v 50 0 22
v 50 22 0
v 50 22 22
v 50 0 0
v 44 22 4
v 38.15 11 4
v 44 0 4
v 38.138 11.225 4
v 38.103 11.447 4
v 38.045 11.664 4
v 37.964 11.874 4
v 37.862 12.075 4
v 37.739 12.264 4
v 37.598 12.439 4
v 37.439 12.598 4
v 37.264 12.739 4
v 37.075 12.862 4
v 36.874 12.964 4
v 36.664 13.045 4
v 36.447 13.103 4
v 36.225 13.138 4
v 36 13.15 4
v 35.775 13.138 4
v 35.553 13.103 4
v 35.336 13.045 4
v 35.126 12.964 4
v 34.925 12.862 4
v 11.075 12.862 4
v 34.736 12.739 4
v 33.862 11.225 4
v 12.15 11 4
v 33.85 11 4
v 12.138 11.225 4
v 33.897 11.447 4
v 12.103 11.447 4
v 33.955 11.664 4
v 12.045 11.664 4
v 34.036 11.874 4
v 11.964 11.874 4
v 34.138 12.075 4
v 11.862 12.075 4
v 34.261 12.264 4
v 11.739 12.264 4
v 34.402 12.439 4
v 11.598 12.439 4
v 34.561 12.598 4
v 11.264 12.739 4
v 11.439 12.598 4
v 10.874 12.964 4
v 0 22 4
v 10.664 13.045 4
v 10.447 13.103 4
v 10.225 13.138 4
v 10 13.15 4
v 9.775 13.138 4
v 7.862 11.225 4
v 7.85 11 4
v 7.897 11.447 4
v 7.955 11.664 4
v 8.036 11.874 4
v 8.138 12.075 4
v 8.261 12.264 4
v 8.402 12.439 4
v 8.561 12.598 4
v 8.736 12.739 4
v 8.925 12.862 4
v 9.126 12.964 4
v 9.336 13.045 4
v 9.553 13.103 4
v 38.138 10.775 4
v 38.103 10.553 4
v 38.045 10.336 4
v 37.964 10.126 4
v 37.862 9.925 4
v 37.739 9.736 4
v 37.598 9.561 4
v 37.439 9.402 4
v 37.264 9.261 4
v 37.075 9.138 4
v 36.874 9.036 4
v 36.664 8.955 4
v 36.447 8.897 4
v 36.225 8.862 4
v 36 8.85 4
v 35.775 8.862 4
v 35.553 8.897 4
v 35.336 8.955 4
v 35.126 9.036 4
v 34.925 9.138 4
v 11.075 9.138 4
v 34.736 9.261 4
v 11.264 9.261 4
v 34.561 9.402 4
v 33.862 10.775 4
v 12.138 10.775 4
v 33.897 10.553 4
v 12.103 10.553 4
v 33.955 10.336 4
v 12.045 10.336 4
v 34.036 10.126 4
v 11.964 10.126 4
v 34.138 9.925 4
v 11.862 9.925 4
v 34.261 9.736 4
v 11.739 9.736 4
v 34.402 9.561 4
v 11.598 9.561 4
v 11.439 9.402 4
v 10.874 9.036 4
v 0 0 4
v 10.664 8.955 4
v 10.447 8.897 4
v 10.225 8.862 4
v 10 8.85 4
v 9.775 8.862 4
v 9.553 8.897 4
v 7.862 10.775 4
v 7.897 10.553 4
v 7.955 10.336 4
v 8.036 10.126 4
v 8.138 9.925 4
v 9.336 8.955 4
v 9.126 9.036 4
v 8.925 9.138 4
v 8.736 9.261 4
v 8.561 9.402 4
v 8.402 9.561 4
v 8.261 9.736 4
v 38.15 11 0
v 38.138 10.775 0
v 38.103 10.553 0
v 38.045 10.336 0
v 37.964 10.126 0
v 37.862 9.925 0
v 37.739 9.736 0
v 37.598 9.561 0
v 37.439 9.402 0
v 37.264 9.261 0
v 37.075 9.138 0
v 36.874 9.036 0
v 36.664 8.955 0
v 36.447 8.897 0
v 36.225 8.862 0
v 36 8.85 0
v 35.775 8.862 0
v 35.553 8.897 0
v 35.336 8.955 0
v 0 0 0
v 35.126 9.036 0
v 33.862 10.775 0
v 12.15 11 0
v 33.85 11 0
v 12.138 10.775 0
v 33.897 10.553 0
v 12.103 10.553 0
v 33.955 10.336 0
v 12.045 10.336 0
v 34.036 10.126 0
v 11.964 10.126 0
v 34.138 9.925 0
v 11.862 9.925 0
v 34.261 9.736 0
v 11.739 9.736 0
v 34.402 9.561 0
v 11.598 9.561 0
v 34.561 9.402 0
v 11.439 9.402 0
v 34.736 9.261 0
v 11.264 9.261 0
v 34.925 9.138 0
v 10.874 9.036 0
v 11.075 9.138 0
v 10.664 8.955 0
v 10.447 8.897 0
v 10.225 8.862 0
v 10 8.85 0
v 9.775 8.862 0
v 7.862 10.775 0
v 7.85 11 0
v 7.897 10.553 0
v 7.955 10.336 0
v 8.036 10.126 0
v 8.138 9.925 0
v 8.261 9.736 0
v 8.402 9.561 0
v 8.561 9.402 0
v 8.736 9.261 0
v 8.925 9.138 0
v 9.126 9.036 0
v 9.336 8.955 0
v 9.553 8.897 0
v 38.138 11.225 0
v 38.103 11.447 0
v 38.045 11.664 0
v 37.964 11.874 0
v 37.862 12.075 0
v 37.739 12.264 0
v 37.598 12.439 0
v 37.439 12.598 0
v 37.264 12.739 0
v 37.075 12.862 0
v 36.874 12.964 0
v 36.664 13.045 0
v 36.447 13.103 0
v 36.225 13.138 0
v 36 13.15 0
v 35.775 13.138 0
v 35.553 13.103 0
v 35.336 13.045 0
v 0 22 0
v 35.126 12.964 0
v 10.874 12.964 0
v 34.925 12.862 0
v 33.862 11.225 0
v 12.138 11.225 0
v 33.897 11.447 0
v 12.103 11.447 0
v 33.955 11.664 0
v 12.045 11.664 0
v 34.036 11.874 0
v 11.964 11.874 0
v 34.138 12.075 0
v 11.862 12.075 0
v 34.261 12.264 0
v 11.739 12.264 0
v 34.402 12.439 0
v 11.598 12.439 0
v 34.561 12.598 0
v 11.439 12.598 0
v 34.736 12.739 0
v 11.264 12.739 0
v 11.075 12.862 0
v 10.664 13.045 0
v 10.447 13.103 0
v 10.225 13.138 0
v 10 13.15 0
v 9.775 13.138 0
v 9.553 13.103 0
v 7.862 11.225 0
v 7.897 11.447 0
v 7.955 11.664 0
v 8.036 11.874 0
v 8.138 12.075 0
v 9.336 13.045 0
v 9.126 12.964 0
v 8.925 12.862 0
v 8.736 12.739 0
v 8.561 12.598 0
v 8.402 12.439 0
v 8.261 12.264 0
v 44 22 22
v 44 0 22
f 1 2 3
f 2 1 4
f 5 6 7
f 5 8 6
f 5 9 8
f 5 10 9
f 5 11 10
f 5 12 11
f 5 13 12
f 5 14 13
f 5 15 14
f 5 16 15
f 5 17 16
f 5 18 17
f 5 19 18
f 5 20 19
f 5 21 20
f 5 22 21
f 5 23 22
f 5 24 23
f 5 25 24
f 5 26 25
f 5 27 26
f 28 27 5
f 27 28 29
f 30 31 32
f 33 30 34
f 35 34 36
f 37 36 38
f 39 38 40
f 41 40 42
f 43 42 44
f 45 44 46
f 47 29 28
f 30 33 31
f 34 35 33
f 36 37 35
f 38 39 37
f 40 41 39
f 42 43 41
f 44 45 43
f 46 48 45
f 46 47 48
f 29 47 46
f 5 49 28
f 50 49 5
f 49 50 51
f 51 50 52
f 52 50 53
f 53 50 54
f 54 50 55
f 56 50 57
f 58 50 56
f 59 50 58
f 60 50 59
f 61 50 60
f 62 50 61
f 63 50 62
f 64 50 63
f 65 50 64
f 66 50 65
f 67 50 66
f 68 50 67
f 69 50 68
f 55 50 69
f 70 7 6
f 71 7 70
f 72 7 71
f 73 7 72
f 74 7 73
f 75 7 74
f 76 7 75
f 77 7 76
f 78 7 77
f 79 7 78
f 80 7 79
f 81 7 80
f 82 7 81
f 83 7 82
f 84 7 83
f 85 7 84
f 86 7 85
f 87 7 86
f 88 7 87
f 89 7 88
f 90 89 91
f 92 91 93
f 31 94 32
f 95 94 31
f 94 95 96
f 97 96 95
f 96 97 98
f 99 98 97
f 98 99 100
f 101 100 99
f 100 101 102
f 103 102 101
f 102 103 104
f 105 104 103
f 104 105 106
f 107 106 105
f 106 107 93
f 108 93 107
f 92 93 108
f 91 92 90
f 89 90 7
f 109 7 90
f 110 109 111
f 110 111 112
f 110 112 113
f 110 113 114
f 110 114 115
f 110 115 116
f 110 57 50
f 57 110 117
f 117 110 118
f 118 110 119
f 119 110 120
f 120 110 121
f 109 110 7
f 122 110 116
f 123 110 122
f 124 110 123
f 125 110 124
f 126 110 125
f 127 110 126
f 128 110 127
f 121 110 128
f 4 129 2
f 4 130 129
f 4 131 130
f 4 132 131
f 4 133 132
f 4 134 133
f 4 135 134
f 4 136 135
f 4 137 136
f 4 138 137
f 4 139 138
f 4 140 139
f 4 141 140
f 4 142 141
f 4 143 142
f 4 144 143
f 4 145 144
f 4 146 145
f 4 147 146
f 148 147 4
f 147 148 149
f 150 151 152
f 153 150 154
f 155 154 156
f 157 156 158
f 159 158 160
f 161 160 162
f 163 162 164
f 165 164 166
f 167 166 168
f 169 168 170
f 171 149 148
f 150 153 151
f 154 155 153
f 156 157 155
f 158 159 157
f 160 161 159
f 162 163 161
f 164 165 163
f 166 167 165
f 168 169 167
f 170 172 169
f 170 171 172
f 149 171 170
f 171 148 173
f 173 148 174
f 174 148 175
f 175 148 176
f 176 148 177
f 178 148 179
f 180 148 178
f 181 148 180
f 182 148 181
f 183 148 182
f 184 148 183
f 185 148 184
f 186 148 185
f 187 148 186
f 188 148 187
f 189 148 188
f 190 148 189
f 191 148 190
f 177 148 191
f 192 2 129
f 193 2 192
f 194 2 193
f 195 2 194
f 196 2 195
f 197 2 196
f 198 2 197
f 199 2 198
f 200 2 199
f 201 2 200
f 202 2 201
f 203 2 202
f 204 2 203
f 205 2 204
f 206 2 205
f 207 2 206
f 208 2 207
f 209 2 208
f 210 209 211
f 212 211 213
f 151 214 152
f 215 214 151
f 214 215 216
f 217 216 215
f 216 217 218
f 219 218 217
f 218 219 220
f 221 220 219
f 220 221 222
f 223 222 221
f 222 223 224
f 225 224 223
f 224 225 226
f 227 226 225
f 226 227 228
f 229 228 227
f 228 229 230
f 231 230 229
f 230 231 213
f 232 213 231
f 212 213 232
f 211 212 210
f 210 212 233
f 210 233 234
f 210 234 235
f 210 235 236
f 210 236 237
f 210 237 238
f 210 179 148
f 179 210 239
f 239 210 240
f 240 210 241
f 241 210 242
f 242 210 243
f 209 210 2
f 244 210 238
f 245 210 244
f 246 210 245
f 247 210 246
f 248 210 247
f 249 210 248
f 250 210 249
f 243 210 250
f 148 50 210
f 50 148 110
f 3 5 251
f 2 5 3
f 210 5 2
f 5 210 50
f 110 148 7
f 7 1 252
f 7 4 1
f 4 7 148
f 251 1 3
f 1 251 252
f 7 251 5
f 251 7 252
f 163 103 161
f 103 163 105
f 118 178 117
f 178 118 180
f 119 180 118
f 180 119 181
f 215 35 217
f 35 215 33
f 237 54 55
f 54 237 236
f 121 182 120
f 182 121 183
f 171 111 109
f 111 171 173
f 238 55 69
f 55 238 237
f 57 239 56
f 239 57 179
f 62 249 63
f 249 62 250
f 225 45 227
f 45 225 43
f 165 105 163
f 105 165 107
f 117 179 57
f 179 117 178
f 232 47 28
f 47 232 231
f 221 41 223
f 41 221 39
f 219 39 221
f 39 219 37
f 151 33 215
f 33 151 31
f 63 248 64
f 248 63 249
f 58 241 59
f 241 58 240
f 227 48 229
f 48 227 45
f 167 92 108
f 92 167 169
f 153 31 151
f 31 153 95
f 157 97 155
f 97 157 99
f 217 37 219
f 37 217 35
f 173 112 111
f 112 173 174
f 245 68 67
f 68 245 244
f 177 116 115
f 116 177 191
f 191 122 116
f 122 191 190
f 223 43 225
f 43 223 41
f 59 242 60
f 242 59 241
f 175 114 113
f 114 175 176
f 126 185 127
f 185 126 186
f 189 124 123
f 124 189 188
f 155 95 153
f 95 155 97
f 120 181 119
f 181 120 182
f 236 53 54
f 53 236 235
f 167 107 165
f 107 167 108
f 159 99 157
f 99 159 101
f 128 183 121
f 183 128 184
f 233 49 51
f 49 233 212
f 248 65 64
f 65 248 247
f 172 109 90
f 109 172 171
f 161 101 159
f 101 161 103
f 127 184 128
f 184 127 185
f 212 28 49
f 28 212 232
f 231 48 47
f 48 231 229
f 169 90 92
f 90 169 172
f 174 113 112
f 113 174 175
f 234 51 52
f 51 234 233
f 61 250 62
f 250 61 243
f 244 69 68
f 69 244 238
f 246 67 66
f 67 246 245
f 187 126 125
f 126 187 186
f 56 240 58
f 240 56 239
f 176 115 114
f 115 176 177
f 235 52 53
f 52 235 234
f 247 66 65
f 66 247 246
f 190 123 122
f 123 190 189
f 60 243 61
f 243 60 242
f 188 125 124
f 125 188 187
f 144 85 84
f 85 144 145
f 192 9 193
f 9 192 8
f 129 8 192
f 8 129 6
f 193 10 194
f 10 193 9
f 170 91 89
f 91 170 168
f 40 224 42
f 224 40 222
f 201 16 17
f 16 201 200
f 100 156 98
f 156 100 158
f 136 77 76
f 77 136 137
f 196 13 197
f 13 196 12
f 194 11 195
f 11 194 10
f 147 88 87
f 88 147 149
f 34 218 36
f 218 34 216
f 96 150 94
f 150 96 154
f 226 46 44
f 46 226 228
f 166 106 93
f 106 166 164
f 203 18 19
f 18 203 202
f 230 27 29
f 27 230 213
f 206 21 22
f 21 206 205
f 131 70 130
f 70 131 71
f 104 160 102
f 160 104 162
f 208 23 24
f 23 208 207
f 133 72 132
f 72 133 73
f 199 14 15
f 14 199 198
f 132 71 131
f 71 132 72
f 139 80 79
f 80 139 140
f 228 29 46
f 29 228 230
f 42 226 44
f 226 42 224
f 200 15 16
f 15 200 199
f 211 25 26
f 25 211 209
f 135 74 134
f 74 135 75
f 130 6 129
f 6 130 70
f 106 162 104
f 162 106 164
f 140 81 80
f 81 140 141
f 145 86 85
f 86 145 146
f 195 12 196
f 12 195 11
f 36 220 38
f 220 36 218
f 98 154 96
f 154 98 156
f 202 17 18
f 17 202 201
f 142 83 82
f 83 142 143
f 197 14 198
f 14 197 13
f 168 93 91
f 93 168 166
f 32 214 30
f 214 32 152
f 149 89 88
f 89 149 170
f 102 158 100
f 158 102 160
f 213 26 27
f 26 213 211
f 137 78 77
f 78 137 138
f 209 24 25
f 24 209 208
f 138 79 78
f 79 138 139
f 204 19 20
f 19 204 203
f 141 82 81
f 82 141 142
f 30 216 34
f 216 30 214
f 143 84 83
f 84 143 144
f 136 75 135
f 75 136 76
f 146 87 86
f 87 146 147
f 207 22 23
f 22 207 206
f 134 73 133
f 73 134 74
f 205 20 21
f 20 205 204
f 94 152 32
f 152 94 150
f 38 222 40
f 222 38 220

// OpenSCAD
// Latch catch plate.
$fn = 60;
eps = 0.02;
length = 50;
height = 18;
width = 22;
thickness = 4;
difference() {
    union() { cube([length,width,thickness]); translate([length-6,0,thickness]) cube([6,width,height]); }
    for(x=[10,length-14]) translate([x,width/2,-eps]) cylinder(d=4.3,h=thickness+2*eps);
}
